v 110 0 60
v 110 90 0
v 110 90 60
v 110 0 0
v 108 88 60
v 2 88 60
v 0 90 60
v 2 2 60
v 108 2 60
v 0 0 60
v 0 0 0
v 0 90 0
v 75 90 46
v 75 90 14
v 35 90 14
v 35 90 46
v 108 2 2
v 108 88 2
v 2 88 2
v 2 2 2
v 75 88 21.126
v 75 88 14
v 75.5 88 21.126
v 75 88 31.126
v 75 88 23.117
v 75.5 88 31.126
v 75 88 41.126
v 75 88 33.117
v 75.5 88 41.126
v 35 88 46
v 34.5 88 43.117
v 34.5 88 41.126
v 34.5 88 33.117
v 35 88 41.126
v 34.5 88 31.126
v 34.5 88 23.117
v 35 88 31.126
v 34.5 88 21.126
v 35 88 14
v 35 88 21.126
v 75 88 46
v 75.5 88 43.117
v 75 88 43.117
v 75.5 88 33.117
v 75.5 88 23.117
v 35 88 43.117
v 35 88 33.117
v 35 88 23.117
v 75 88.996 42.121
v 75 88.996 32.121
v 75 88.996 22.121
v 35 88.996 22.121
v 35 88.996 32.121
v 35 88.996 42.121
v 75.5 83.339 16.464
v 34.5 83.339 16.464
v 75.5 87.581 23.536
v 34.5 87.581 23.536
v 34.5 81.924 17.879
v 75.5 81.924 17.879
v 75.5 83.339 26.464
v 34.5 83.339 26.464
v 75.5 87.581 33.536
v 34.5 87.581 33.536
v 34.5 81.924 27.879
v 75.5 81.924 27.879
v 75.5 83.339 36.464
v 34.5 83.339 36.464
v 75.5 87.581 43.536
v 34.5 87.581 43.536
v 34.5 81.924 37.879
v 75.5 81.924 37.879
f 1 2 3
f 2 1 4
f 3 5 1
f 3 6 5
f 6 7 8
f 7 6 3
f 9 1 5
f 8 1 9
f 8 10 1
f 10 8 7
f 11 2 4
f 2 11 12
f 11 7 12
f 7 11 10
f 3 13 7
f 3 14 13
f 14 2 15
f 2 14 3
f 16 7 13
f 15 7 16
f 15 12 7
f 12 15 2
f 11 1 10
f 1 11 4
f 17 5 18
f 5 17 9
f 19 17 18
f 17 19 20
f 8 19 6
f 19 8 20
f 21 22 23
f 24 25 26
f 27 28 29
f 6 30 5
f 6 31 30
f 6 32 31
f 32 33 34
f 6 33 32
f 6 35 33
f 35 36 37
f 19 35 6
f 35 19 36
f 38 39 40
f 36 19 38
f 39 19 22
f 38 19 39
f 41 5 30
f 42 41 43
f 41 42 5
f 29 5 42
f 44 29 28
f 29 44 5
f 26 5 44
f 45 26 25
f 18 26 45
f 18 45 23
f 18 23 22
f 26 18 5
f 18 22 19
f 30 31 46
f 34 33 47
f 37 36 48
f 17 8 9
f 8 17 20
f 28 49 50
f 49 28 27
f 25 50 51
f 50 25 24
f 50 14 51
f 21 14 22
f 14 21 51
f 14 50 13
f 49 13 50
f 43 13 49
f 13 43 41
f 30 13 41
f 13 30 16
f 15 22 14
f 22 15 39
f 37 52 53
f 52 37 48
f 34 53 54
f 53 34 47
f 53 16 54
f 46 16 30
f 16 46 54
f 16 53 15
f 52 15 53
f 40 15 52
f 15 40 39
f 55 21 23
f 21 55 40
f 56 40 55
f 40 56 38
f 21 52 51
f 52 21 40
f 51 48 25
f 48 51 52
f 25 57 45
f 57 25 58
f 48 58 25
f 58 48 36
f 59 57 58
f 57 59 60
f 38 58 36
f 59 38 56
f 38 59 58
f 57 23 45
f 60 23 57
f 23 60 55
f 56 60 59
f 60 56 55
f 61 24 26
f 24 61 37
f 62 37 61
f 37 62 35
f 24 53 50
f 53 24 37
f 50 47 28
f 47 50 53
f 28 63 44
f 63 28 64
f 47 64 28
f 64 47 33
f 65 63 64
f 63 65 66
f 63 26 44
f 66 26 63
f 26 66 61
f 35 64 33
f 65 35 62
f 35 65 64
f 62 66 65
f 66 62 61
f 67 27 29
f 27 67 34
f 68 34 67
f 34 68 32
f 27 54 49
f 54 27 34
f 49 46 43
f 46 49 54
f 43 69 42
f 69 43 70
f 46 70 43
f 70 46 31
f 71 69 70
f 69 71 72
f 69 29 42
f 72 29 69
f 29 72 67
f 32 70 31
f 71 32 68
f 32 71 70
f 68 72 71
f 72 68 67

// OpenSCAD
$fn = 32;

// ----------------------------------------------------------------------
// Vent box: louvers enclosure
// ----------------------------------------------------------------------

// --- parameters (mm) ---
box_l = 110;              // box length, X
box_w = 90;               // box width, Y
box_h = 60;               // box height, Z
wall_t = 2;               // shell wall thickness
win_l = 40;               // vent window width, X
win_h = 32;               // vent window height, Z
slat_t = 2;               // louver slat thickness
slat_d = 8;               // louver slat depth
slat_a = 45;              // louver slat angle, degrees
slat_pitch = 10;          // louver pitch
slat_yc = 85.46;          // slat centreline Y

win_z0 = (box_h - win_h) / 2;  // window lower edge Z
n_slats = 3;  // louver count
slat_z0 = win_z0 + (win_h - (n_slats - 1) * slat_pitch) / 2;

difference() {
  union() {
    difference() {
      cube([box_l, box_w, box_h]);
  translate([wall_t, wall_t, wall_t])
    cube([box_l - 2 * wall_t, box_w - 2 * wall_t, box_h]);
  translate([(box_l - win_l) / 2, box_w - wall_t - 1, win_z0])
    cube([win_l, wall_t + 2, win_h]);
    }
    for (i = [0 : n_slats - 1])
      translate([box_l / 2, slat_yc, slat_z0 + i * slat_pitch])
        rotate([slat_a, 0, 0])
          cube([win_l + 1, slat_d, slat_t], center = true);
  }
}
